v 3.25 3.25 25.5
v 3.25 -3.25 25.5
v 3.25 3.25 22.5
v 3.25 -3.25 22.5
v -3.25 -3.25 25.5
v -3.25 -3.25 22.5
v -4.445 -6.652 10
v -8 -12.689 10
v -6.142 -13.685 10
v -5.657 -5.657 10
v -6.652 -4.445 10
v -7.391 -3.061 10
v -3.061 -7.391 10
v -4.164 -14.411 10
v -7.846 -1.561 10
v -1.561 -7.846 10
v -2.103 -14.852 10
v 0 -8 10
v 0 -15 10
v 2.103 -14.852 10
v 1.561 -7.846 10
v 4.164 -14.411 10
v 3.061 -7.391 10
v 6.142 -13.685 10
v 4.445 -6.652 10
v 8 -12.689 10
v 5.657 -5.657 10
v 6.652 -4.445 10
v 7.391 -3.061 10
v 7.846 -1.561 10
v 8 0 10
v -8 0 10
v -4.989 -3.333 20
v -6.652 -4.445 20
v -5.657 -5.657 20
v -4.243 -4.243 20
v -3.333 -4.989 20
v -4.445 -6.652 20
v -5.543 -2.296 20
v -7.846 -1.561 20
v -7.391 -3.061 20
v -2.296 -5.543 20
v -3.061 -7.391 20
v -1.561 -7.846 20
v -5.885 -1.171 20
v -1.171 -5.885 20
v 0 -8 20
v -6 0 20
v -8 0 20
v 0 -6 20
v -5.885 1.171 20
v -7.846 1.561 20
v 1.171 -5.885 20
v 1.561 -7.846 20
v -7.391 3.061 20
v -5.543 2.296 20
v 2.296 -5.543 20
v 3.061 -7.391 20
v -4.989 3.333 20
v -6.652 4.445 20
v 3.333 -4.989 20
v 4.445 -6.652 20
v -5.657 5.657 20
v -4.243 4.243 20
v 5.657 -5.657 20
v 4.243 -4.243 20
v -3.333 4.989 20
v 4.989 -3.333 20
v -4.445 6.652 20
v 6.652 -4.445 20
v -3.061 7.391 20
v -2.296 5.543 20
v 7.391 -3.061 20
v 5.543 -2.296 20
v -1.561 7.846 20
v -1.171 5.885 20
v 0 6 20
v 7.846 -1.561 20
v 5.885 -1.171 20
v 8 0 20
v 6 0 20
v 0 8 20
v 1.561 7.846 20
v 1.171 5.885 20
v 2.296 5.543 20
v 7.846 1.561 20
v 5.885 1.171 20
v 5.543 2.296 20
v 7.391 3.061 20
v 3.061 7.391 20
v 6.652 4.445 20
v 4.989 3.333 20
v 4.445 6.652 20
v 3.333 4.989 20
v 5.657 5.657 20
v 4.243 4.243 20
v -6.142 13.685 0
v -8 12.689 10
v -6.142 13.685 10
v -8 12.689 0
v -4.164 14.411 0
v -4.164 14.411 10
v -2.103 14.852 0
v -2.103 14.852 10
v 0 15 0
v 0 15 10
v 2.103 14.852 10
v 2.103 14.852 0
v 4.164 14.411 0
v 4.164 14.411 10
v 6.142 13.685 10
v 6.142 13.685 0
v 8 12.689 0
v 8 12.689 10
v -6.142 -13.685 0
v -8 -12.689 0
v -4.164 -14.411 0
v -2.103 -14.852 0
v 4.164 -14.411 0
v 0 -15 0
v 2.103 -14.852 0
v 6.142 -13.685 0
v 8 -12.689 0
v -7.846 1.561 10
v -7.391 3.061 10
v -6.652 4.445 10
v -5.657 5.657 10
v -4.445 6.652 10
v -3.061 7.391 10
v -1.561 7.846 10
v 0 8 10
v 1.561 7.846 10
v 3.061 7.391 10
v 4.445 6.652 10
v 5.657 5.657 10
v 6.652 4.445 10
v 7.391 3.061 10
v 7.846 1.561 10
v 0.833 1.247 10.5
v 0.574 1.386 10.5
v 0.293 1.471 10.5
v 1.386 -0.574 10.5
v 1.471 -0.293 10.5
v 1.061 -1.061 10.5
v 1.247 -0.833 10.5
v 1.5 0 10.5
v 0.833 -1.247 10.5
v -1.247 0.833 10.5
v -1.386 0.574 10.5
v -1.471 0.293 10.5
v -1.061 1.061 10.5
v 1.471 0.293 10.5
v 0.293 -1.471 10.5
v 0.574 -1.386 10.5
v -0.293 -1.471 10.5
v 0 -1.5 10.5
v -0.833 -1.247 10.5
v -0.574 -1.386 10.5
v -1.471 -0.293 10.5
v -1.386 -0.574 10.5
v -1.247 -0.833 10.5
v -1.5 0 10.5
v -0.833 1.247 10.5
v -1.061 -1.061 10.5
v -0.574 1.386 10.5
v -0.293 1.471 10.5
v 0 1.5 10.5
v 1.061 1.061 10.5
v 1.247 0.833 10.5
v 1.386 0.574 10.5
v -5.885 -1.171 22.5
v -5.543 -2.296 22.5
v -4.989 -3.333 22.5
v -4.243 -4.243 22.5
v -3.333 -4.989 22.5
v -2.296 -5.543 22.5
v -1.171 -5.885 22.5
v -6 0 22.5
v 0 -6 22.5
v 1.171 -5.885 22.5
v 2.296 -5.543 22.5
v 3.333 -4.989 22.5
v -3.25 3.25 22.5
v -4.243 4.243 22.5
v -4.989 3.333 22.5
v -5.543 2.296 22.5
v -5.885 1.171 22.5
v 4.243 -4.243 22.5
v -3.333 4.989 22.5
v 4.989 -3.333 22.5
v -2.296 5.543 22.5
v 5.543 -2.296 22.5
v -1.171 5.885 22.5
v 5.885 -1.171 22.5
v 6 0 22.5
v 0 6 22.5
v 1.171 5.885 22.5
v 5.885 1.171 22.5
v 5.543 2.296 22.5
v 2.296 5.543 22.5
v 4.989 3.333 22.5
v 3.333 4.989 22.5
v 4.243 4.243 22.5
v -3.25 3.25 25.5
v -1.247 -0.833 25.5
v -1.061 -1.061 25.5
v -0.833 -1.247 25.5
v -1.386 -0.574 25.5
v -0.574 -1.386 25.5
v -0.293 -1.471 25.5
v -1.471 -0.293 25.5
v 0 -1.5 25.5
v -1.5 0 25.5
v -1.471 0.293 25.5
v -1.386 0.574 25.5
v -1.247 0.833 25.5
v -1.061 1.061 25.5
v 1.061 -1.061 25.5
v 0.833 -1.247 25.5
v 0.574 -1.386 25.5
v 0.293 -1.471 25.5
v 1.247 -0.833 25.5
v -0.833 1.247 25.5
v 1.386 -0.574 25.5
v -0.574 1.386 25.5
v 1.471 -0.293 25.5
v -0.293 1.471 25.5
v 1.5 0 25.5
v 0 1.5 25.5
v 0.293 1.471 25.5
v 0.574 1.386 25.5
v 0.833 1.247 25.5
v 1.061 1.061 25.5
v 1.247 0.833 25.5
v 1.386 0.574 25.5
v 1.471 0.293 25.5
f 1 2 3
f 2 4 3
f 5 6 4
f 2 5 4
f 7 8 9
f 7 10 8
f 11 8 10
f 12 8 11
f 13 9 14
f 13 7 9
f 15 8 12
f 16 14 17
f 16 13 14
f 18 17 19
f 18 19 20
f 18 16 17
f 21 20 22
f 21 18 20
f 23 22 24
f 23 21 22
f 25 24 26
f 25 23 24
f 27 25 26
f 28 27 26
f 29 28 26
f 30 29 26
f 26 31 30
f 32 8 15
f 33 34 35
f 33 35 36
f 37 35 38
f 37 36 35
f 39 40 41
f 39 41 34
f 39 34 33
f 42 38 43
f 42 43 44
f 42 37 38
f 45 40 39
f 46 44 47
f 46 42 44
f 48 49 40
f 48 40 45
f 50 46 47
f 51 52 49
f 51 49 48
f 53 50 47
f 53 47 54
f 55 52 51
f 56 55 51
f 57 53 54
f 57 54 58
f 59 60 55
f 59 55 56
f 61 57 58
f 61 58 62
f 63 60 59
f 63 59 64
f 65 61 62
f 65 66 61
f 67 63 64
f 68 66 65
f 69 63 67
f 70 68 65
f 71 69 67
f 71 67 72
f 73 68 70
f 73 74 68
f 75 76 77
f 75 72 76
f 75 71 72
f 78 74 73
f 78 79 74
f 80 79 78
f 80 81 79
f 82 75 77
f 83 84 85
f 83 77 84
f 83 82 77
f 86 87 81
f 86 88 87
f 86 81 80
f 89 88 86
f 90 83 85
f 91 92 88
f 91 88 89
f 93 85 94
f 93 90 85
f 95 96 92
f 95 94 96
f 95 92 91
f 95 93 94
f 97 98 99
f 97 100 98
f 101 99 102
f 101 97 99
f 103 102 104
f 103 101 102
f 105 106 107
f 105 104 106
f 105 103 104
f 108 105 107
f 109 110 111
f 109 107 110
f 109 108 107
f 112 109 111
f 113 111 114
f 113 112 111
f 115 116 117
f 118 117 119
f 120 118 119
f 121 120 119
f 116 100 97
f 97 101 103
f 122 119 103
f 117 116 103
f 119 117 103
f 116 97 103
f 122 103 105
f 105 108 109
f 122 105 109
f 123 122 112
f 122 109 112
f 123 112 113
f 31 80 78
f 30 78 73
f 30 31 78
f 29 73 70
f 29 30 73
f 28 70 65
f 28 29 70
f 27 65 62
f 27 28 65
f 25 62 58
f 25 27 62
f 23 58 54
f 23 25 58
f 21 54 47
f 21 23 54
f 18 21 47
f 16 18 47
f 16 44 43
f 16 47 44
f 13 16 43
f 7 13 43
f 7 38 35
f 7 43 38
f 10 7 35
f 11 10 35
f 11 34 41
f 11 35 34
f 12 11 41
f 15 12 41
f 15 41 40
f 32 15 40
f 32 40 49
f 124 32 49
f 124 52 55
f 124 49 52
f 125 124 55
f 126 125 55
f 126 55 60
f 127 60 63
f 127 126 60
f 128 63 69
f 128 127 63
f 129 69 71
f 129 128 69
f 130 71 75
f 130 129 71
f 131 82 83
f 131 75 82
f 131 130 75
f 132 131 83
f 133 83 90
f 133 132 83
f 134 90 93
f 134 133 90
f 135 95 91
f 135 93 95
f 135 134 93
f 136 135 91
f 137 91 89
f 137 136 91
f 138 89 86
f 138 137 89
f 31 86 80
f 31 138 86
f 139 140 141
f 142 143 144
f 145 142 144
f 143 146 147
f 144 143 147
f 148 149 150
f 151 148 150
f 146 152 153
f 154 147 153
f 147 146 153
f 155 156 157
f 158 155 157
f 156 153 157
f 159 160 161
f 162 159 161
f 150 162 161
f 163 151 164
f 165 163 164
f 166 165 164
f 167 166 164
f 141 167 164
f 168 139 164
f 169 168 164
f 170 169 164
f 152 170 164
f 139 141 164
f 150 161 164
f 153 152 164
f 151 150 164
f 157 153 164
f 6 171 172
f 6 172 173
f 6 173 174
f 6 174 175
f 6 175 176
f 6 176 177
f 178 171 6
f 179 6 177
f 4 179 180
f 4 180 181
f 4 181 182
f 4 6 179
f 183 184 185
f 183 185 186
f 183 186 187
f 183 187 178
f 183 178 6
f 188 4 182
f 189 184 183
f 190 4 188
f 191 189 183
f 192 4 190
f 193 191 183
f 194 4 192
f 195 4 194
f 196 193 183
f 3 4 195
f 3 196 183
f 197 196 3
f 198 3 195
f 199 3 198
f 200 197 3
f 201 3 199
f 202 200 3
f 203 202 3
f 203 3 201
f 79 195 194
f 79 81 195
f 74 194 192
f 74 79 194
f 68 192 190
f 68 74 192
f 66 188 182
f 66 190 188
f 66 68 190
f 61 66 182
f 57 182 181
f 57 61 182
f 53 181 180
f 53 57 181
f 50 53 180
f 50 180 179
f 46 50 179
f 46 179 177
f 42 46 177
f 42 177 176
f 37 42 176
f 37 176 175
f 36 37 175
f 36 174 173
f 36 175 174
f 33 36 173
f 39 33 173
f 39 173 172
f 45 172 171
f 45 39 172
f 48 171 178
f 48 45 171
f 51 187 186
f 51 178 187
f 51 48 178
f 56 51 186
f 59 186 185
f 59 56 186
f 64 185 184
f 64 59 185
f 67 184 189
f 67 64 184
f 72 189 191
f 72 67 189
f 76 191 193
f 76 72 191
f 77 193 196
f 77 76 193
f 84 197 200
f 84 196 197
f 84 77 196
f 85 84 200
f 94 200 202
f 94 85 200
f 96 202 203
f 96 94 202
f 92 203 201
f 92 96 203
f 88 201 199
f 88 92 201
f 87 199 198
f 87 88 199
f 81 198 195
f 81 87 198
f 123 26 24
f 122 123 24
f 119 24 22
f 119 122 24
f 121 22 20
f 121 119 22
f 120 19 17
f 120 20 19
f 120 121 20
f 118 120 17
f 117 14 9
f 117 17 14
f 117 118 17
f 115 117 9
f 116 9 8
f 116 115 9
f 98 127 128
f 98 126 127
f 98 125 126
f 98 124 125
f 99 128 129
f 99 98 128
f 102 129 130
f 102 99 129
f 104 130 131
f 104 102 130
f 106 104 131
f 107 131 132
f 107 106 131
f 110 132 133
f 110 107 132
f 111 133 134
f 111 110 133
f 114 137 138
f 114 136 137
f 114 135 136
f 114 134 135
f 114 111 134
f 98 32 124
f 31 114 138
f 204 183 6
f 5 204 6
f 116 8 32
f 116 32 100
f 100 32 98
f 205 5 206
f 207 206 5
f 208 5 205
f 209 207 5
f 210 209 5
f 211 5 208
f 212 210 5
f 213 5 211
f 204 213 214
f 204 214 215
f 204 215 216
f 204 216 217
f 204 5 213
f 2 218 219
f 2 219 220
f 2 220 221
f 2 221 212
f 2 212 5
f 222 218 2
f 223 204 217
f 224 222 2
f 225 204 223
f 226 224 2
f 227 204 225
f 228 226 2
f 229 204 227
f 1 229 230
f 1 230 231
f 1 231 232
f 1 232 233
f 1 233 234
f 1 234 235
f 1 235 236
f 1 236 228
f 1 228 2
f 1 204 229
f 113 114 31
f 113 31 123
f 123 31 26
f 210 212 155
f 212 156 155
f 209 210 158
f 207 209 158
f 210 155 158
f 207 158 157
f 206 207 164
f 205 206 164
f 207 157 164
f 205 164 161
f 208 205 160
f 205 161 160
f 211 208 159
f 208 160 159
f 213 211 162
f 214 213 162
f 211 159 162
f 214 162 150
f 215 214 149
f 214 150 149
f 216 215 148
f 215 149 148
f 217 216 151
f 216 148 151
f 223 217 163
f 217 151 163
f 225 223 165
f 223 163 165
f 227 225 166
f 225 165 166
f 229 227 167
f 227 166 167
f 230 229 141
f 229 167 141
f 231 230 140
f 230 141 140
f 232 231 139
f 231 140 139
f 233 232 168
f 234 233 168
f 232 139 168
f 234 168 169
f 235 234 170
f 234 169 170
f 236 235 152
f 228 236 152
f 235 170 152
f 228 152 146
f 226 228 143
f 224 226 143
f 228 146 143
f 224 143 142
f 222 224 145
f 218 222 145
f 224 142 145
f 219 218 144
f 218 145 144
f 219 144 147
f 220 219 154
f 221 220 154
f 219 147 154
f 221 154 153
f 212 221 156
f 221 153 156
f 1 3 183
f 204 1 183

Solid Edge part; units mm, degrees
sketch "Sketch1" plane through (0, 0, 0) normal (0, 0, 1) x (1, 0, 0)
  circle A0 centre (0, 0) radius 15
extrude "Protrusion1" add sketch "Sketch1" along normal blind 10
sketch "Sketch2" plane through (0, 0, 10) normal (0, 0, 1) x (1, 0, 0)
  circle A0 centre (0, 0) radius 8
  dimension "D1" = 16
extrude "Extrusionsausprägung_2" add sketch "Sketch2" along normal blind 10
sketch "Sketch3" plane through (0, 0, 20) normal (0, 0, 1) x (1, 0, 0)
  circle A0 centre (0, 0) radius 6
  dimension "D1" = 12
extrude "Extrusionsausprägung_3" add sketch "Sketch3" along normal blind 2.5
sketch "Sketch4" plane through (0, 0, 22.5) normal (0, 0, 1) x (1, 0, 0)
  line L0 (-3.25, -3.25) -> (3.25, -3.25)
  line L1 (3.25, -3.25) -> (3.25, 3.25)
  line L2 (3.25, 3.25) -> (-3.25, 3.25)
  line L3 (-3.25, 3.25) -> (-3.25, -3.25)
extrude "Extrusionsausprägung_4" add sketch "Sketch4" along normal blind 3
sketch "Sketch5" plane through (0, 0, 10) normal (0, 0, 1) x (1, 0, 0)
  line L0 (-16.4348, 18.9803) -> (16.4348, 18.9803)
  line L1 (16.4348, 18.9803) -> (16.4348, -18.9803)
  line L2 (16.4348, -18.9803) -> (-16.4348, -18.9803)
  line L3 (-16.4348, -18.9803) -> (-16.4348, 18.9803)
  line L4 (-8, 16.4595) -> (8, 16.4595)
  line L5 (8, 16.4595) -> (8, -16.4595)
  line L6 (8, -16.4595) -> (-8, -16.4595)
  line L7 (-8, -16.4595) -> (-8, 16.4595)
  dimension "D1" = 16
extrude "Cutout1" cut sketch "Sketch5" against normal through all
hole "Bohrung_1" at (0, 0, 25.5) direction (0, 0, -1) diameter 3 depth 15
